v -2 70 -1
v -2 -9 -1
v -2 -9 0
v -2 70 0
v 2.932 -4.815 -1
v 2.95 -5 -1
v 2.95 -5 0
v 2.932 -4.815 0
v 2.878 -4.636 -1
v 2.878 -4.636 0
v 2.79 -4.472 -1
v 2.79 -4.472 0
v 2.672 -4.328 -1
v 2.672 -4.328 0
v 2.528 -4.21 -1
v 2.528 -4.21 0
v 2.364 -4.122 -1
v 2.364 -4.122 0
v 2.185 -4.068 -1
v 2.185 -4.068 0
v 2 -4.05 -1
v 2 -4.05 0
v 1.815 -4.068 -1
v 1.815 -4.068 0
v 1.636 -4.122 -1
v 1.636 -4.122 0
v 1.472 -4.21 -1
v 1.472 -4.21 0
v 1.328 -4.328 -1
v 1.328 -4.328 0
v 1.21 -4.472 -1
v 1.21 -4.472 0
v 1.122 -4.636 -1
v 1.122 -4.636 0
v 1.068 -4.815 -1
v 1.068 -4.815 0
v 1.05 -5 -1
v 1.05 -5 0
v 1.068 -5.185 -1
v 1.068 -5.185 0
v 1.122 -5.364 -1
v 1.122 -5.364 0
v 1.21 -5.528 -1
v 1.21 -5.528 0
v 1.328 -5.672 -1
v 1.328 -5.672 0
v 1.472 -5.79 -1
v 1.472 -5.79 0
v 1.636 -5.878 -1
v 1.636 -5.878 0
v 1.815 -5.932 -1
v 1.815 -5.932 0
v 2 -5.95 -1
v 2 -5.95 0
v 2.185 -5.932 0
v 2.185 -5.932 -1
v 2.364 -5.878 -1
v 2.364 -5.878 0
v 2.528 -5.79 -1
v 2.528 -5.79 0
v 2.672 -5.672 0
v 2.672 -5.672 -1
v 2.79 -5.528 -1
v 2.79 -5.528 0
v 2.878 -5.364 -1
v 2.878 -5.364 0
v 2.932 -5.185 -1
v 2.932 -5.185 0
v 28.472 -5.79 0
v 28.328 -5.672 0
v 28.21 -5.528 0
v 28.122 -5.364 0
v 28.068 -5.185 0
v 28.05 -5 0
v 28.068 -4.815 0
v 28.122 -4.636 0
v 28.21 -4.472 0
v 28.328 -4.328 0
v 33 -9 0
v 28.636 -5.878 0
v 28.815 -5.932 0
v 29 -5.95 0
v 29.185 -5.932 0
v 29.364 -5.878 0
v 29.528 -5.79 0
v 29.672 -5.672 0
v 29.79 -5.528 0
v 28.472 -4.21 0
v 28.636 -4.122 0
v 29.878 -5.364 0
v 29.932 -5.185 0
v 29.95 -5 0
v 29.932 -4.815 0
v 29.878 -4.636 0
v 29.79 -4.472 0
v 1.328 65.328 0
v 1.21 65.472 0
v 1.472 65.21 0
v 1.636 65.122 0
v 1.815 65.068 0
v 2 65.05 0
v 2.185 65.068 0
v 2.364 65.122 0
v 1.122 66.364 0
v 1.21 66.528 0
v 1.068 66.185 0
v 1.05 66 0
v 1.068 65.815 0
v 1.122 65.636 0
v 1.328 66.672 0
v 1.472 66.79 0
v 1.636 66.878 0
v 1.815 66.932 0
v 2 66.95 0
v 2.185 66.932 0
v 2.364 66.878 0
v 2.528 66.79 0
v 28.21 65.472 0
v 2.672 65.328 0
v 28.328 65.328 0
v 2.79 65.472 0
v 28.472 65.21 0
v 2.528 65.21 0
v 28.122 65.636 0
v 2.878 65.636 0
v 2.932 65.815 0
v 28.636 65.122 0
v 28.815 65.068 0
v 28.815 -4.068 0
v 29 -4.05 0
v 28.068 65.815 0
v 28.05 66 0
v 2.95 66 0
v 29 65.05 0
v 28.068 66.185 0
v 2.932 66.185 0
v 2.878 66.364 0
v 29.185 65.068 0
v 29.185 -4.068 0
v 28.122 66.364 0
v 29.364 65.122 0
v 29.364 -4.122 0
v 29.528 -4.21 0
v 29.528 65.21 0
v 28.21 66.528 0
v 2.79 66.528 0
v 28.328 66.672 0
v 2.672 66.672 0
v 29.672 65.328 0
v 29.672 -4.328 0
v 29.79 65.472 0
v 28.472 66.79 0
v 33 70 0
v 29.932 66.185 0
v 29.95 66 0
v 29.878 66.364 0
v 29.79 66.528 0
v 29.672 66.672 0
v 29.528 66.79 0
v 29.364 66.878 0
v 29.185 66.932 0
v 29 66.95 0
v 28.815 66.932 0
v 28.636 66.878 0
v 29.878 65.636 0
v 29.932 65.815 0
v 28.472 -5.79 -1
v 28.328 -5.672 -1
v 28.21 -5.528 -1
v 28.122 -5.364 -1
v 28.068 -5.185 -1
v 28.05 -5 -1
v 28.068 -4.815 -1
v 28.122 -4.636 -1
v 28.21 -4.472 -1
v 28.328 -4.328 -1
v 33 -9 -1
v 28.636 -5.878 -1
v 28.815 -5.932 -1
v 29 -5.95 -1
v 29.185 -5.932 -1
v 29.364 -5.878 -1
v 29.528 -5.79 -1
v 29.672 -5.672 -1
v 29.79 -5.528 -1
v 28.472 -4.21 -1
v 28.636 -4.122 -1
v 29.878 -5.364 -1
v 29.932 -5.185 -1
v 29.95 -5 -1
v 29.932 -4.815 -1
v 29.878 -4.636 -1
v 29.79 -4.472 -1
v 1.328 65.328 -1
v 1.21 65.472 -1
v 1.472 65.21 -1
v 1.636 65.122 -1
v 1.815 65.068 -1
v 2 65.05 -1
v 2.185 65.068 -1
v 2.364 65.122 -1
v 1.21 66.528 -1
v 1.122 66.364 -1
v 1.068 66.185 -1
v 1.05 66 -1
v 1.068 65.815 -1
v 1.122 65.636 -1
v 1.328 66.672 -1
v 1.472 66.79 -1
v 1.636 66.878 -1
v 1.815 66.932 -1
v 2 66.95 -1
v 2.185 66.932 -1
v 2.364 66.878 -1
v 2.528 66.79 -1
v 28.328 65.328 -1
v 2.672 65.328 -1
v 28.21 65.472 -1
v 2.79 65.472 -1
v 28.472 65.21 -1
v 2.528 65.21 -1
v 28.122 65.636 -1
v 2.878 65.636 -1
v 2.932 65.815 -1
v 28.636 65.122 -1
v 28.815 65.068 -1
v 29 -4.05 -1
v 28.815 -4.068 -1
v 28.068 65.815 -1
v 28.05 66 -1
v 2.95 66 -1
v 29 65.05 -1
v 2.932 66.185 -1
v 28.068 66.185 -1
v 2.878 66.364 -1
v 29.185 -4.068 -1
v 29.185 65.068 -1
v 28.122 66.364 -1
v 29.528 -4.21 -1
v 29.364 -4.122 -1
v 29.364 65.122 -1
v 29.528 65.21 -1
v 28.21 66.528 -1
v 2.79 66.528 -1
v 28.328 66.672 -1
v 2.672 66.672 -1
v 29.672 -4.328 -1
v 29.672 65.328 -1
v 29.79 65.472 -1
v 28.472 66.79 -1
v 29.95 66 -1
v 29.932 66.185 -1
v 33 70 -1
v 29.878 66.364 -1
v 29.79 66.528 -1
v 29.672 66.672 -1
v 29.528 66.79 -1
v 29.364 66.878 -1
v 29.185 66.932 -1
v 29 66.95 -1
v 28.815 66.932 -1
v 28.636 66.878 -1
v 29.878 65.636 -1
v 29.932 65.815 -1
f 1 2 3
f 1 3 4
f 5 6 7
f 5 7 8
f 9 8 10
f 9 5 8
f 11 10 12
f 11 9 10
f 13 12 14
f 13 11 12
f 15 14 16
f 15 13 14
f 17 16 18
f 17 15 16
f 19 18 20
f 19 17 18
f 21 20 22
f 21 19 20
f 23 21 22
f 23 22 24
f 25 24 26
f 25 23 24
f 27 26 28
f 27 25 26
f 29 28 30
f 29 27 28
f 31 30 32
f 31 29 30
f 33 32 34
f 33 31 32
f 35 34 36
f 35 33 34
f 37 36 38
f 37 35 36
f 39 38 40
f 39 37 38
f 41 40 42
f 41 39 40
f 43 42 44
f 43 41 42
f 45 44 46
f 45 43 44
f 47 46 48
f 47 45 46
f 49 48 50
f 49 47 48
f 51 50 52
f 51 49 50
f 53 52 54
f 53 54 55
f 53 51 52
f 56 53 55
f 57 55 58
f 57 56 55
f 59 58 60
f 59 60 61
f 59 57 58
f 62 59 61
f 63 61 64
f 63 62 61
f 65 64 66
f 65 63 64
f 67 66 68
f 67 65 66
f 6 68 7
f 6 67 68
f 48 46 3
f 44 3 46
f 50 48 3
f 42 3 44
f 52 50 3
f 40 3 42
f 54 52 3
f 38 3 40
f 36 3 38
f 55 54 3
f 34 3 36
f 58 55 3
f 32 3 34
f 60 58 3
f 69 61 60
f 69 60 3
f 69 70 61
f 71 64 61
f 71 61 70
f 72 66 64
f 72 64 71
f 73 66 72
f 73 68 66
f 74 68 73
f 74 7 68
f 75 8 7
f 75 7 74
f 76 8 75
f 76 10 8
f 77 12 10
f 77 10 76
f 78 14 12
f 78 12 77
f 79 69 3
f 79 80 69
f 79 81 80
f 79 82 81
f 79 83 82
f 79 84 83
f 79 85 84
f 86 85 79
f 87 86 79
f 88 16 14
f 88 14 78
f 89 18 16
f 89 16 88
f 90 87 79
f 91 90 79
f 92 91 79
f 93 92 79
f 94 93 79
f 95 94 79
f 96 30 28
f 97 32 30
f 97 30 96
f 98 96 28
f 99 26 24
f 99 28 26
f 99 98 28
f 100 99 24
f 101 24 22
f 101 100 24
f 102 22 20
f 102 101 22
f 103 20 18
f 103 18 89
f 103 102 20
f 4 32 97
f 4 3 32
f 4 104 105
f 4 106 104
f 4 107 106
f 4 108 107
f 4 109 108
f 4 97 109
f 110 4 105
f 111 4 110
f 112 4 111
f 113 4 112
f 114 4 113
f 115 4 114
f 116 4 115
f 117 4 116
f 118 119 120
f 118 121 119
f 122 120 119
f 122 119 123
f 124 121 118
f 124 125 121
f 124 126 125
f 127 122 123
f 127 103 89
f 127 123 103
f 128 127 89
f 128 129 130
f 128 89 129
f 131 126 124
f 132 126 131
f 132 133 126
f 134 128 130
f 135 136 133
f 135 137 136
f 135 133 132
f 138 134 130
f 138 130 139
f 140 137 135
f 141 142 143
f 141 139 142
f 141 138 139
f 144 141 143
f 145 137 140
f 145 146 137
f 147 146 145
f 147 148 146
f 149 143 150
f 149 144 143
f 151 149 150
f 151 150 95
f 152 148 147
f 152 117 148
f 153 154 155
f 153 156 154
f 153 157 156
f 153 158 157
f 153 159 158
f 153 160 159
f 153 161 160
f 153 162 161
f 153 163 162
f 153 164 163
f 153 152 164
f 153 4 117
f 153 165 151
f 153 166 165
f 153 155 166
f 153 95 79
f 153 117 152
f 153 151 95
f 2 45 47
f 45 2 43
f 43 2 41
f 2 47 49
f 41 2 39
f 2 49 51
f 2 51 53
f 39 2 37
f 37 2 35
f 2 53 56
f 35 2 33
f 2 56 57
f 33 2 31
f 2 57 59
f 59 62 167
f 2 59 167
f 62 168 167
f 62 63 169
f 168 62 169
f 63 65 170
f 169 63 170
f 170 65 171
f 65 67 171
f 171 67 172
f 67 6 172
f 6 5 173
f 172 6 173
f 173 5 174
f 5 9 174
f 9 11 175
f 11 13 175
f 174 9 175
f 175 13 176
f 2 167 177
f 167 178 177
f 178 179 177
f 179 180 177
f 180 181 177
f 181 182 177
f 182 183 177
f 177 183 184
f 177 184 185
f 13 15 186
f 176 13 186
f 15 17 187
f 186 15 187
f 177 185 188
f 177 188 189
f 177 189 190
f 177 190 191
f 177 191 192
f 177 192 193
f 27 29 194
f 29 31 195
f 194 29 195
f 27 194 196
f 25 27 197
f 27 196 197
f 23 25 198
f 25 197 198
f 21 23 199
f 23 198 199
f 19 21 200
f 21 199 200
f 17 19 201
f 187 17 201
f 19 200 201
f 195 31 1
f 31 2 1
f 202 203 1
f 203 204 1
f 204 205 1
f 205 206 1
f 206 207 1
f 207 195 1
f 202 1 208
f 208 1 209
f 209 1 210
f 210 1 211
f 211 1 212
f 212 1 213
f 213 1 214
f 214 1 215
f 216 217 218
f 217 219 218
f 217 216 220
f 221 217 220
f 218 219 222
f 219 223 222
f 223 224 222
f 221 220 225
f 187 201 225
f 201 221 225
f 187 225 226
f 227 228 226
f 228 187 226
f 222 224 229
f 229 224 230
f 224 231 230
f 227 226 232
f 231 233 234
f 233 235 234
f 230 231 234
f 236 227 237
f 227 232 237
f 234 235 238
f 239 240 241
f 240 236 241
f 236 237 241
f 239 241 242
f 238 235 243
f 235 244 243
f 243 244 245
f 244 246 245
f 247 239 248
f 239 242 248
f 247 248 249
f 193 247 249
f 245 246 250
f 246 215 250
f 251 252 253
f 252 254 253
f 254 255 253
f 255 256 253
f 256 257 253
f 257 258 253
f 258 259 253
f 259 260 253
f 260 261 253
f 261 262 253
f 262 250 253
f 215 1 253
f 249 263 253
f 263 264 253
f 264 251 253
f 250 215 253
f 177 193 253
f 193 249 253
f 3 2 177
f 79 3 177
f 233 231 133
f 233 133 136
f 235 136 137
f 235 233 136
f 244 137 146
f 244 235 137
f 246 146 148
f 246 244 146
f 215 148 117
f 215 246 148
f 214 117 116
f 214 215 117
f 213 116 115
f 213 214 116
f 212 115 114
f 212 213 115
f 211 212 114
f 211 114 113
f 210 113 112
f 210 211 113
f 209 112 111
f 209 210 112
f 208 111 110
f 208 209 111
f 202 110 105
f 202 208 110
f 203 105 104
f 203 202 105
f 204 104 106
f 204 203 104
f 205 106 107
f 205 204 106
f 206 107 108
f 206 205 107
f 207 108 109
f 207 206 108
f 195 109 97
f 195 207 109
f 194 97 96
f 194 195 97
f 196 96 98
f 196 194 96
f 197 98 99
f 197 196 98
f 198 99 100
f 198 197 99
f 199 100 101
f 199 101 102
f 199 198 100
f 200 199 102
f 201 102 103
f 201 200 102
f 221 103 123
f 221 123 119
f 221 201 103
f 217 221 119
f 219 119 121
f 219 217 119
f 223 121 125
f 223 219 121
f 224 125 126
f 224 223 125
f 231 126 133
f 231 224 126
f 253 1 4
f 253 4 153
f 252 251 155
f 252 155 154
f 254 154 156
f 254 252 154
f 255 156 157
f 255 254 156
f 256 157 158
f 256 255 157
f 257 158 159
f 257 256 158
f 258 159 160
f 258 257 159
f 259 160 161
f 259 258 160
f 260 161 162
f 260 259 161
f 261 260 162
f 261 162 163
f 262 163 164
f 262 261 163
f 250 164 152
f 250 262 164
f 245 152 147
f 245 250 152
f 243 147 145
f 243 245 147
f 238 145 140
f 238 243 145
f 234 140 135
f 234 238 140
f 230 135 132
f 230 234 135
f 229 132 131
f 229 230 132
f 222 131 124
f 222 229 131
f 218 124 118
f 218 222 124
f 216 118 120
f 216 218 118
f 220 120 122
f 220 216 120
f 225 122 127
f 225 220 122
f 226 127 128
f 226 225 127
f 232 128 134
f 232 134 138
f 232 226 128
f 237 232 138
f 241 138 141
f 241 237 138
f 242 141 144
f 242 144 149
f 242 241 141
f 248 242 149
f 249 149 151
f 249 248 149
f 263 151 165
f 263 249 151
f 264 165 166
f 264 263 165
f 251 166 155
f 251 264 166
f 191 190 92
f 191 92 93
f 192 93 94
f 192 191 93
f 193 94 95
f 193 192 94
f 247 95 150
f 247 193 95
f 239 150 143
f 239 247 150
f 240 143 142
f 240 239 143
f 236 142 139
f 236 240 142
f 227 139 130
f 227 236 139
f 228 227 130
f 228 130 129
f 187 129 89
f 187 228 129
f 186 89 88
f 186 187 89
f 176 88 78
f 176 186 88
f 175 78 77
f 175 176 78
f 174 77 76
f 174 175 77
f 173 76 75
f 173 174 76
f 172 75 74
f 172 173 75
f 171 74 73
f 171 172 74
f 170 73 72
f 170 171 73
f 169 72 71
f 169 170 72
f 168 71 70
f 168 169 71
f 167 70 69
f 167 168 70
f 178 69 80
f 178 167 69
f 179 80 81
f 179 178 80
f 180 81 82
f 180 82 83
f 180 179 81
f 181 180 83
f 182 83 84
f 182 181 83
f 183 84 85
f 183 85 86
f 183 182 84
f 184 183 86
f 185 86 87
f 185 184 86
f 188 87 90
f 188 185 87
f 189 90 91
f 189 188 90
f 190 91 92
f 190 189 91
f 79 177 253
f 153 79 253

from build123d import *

# Parameters (mm, degrees)
SKETCH010_W      = 4
SKETCH010_H      = 5
EXTRUDE008_DEPTH = 4
SKETCH006_W      = 35
SKETCH006_H      = 79
SKETCH006_R      = 0.95
EXTRUDE004_DEPTH = 1


with BuildPart() as led005:
    # Sketch010 → Extrude008 (new body)
    with BuildSketch(Plane(origin=(-3, 0, 0), x_dir=(0, -1, 0), z_dir=(-1, 0, 0))):
        with Locations((-5, 2.5)):
            Rectangle(SKETCH010_W, SKETCH010_H)
    extrude(amount=-EXTRUDE008_DEPTH)


with BuildPart() as cut004:
    # Sketch006 → Extrude004 (new body)
    with BuildSketch(Plane.XY.offset(-1)):
        with Locations((15.5, 30.5)):
            Rectangle(SKETCH006_W, SKETCH006_H)
        with Locations((2, -5)):
            Circle(SKETCH006_R, mode=Mode.SUBTRACT)
        with Locations((29, -5)):
            Circle(SKETCH006_R, mode=Mode.SUBTRACT)
        with Locations((2, 66)):
            Circle(SKETCH006_R, mode=Mode.SUBTRACT)
        with Locations((29, 66)):
            Circle(SKETCH006_R, mode=Mode.SUBTRACT)
    extrude(amount=EXTRUDE004_DEPTH)

    # Cut004: cut led005
    add(led005.part, mode=Mode.SUBTRACT)


solid = cut004.part
